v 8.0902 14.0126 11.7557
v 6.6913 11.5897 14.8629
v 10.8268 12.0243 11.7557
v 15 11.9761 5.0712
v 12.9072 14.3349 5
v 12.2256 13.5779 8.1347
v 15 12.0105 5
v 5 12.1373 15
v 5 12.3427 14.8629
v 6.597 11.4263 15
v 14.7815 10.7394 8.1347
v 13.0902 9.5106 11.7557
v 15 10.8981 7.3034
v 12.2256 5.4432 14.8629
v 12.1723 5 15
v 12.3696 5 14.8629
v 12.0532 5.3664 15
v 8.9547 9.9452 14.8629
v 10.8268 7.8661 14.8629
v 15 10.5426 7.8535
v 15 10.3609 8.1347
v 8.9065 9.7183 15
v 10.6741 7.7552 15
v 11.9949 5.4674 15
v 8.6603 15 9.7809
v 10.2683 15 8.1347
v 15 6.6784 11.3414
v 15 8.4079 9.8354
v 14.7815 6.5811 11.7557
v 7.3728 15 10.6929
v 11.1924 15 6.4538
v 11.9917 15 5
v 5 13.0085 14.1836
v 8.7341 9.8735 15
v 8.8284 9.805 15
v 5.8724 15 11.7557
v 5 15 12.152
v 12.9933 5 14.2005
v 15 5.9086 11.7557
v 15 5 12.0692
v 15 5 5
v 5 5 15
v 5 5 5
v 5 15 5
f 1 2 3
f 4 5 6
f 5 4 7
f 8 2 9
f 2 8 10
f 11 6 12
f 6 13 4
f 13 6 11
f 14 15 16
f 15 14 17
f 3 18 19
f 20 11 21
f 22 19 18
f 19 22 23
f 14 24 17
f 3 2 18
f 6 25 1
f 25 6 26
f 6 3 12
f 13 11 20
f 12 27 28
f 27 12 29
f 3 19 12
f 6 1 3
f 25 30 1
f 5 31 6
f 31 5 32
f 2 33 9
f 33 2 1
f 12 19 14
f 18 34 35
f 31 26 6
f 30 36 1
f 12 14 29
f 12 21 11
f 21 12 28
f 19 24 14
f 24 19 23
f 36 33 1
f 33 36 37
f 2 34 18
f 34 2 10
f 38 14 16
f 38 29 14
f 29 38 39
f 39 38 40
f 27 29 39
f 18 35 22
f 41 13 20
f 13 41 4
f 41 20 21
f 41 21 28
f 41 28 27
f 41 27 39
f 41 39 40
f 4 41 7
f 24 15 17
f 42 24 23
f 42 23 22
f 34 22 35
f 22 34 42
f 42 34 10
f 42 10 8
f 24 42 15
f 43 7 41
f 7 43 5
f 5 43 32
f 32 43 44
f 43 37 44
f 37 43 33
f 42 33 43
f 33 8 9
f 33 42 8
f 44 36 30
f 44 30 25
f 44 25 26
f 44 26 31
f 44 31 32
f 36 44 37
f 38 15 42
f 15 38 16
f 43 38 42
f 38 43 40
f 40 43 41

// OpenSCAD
intersection( )
{
    sphere(20);
    translate([5,5,5]) cube(10);
}
